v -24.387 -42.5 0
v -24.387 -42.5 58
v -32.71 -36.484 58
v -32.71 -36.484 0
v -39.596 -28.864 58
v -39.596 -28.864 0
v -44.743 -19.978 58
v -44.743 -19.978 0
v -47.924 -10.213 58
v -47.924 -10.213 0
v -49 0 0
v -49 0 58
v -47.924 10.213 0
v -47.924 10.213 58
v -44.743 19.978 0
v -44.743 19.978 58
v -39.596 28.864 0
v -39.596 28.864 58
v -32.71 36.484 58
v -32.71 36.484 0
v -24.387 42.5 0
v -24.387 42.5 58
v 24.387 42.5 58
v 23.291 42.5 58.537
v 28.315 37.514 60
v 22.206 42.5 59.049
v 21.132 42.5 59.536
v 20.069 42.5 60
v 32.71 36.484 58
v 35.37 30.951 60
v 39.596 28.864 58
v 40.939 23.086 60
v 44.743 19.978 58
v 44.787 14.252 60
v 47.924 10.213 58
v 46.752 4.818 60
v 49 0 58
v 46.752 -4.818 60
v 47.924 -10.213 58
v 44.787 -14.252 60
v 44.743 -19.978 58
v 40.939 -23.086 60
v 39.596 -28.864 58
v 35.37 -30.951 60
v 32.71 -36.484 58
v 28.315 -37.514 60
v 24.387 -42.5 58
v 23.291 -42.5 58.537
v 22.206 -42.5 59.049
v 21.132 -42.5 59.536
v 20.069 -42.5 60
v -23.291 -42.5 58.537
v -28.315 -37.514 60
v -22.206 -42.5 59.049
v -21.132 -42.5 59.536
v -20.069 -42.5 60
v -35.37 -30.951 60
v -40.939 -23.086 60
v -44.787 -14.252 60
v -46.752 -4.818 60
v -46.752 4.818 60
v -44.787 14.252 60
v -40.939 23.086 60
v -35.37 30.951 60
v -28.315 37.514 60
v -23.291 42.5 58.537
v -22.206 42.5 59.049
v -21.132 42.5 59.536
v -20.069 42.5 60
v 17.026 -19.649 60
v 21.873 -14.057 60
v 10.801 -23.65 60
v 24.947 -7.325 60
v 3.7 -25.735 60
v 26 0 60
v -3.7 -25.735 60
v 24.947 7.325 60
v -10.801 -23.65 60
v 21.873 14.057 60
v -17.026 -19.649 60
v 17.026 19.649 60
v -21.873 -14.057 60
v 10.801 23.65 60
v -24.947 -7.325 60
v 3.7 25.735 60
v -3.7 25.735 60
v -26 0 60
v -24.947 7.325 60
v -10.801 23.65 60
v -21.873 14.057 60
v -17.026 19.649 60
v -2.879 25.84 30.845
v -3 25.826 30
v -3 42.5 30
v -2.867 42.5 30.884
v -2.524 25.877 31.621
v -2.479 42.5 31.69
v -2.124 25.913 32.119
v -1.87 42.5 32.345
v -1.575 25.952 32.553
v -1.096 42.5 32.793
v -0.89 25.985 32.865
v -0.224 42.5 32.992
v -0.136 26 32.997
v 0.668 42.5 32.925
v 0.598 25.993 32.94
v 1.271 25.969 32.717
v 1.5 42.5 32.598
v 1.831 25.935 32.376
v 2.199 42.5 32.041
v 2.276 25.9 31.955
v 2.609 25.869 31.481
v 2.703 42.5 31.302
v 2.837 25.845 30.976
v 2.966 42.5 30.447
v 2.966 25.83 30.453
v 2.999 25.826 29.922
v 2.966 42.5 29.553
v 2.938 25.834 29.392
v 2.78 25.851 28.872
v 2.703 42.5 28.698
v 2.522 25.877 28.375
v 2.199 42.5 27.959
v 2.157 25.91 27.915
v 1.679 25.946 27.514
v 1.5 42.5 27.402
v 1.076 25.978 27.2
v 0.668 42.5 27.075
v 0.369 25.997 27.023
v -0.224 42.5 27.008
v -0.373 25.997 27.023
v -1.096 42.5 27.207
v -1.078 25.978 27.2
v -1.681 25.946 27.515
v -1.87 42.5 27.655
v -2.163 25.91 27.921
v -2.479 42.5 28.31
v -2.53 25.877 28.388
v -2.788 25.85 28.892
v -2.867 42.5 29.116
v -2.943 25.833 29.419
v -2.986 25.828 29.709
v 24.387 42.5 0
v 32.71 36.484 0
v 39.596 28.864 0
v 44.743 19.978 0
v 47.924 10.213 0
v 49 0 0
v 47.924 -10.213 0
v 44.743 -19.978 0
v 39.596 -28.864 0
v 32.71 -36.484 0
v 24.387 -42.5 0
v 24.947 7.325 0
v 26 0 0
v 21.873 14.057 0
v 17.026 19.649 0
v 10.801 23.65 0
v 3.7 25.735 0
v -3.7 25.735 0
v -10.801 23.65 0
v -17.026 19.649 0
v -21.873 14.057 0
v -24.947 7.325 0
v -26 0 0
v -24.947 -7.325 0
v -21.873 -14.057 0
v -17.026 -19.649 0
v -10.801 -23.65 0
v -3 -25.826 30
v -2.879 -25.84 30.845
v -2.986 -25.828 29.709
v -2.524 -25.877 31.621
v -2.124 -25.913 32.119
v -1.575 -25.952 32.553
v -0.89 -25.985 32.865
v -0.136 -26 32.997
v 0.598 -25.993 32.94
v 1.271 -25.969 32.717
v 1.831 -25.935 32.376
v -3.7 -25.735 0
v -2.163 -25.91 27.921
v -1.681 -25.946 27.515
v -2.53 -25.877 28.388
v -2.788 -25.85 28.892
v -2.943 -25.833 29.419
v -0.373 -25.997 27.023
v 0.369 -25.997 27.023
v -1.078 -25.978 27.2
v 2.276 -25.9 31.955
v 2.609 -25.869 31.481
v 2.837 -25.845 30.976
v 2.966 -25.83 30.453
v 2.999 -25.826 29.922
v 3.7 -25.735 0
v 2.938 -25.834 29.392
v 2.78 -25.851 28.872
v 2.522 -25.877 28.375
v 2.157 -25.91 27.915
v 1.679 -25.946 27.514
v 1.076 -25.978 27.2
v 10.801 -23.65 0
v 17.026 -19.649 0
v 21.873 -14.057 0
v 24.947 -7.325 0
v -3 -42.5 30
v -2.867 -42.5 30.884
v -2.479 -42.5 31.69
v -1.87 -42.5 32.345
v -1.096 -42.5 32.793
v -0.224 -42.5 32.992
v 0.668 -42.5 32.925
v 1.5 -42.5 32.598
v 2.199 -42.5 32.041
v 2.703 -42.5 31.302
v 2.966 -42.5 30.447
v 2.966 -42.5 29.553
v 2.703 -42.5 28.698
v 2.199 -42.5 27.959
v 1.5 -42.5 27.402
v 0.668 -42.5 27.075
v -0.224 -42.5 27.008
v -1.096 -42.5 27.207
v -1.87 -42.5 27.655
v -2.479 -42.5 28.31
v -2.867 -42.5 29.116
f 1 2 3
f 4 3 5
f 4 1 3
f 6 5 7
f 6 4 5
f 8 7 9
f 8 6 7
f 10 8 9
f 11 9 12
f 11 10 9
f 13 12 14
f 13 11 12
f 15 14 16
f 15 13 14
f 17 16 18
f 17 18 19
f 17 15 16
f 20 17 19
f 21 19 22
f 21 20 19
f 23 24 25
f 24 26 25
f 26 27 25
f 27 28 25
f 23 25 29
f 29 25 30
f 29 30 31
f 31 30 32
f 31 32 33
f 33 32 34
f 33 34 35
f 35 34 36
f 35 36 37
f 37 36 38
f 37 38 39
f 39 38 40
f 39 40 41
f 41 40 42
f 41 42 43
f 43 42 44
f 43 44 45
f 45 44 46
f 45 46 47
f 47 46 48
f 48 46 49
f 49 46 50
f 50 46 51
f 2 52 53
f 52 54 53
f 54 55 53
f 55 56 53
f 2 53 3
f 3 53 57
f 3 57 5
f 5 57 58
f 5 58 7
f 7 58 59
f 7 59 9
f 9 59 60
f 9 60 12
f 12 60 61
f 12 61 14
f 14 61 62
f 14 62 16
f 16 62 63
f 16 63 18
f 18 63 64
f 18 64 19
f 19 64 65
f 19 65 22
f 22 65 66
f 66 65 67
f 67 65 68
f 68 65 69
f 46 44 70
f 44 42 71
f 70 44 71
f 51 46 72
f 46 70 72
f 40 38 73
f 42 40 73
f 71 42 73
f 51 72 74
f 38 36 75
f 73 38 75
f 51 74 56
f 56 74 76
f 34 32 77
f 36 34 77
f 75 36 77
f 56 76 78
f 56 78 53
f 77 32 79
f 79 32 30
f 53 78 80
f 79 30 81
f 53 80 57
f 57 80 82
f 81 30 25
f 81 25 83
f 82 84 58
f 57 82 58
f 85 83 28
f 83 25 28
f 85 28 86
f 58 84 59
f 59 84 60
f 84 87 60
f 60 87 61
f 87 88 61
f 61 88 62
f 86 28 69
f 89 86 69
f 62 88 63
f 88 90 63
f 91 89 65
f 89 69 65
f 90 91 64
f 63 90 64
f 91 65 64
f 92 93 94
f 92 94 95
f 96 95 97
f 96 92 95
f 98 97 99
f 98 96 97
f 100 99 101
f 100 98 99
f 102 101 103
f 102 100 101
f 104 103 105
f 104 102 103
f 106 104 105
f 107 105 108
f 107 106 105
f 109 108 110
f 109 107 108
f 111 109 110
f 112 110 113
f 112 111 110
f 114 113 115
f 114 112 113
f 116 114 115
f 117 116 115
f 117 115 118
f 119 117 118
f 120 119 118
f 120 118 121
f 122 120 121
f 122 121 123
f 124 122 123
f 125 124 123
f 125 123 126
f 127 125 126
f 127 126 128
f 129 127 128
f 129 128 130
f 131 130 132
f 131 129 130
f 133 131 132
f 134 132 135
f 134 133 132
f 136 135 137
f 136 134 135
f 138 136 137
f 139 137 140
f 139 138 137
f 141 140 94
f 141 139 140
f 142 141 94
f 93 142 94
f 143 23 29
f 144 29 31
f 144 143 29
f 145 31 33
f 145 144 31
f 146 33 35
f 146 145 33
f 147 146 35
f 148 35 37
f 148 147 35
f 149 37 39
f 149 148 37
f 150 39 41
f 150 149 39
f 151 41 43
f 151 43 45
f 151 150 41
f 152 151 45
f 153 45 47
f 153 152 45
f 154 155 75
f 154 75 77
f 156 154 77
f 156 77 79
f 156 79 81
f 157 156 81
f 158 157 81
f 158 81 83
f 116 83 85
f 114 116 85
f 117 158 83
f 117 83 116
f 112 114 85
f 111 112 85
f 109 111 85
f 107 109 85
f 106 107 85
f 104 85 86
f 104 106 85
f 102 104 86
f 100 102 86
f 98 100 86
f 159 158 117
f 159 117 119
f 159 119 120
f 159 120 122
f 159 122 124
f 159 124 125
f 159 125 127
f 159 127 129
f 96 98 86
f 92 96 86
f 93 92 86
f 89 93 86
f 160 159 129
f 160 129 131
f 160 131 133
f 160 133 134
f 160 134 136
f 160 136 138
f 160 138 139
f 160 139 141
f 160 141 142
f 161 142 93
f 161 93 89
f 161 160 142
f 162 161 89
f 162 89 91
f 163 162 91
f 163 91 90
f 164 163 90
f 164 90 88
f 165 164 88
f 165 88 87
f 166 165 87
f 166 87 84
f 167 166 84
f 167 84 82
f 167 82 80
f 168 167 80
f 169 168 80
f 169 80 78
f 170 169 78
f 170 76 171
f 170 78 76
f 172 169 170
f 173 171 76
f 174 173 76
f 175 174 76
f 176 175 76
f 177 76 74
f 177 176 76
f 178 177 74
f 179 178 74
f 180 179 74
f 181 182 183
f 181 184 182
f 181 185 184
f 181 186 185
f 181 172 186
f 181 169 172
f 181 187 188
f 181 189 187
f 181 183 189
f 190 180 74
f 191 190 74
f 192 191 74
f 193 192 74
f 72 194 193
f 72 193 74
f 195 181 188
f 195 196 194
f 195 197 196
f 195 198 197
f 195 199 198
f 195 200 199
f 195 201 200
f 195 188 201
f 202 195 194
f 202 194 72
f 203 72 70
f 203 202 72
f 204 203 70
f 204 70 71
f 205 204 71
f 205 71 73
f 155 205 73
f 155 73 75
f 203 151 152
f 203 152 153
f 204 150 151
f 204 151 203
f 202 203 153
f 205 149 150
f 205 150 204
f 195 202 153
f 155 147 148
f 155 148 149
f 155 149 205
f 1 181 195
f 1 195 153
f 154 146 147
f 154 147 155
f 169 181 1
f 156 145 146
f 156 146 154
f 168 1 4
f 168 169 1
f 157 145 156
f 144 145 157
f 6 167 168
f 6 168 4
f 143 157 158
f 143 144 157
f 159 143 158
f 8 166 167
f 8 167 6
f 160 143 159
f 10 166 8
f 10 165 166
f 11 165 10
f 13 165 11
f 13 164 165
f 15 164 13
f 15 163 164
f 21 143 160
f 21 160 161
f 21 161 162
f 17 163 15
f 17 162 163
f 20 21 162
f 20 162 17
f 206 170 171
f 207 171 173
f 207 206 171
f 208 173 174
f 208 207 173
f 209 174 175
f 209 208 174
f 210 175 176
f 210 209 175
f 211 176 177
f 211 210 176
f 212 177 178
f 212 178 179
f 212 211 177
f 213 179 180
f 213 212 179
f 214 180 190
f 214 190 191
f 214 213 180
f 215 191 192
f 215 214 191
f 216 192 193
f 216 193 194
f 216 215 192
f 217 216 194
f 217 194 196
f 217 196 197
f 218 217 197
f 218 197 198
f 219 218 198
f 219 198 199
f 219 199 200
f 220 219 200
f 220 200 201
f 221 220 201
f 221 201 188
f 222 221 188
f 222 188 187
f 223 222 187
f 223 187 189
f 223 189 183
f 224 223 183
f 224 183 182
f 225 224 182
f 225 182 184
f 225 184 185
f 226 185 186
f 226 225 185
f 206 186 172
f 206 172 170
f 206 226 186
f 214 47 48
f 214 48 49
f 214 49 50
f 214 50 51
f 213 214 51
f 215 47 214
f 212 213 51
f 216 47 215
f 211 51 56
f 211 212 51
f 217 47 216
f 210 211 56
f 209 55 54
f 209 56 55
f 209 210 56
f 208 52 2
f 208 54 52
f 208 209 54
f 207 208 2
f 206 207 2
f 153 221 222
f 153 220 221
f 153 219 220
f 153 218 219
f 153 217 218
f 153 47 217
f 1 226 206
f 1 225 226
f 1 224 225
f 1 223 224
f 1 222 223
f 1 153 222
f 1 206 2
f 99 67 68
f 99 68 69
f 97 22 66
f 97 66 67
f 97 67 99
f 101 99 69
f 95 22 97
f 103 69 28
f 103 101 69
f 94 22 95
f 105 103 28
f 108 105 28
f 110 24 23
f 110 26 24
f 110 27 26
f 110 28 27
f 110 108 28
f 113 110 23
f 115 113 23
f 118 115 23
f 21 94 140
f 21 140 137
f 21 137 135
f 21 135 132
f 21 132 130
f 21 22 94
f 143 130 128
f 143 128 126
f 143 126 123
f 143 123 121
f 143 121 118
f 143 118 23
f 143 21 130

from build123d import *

# Parameters (mm, degrees)
SKETCH1_R               = 26
BOSS_EXTRUDE1_DEPTH     = 60
CHAMFER1_SIZE           = 2
CUT_EXTRUDE1_DEPTH      = 116.004347744
CUT_EXTRUDE1_DEPTH_BACK = 116.004347744
SKETCH2_R               = 3


with BuildPart() as part:
    # Sketch1 → Boss-Extrude1 (new body)
    with BuildSketch(Plane.XY):
        with BuildLine():
            Line((-24.387496797, 42.5), (24.387496797, 42.5))
            ThreePointArc((24.387496797, 42.5), (49, 0), (24.387496797, -42.5))
            Line((24.387496797, -42.5), (-24.387496797, -42.5))
            ThreePointArc((-24.387496797, -42.5), (-49, 0), (-24.387496797, 42.5))
        make_face()
        Circle(SKETCH1_R, mode=Mode.SUBTRACT)
    extrude(amount=BOSS_EXTRUDE1_DEPTH)

    # Chamfer1
    chamfer1_edges = [part.edges().sort_by_distance(p)[0] for p in [
        (49, 0, 60),
        (-49, 0, 60),
    ]]
    chamfer(chamfer1_edges, length=CHAMFER1_SIZE)

    # Sketch2 → Cut-Extrude1 (cut, two sides: drawn at the far end of the back side and taken through both)
    with BuildSketch(Plane(origin=(0, 42.5, 0), x_dir=(1, 0, 0), z_dir=(0, 1, 0)).offset(-CUT_EXTRUDE1_DEPTH_BACK)):
        with Locations(Location((0, -30, 0), (0, 0, 180))):
            Circle(SKETCH2_R)
    extrude(amount=CUT_EXTRUDE1_DEPTH + CUT_EXTRUDE1_DEPTH_BACK, mode=Mode.SUBTRACT)


solid = part.part
